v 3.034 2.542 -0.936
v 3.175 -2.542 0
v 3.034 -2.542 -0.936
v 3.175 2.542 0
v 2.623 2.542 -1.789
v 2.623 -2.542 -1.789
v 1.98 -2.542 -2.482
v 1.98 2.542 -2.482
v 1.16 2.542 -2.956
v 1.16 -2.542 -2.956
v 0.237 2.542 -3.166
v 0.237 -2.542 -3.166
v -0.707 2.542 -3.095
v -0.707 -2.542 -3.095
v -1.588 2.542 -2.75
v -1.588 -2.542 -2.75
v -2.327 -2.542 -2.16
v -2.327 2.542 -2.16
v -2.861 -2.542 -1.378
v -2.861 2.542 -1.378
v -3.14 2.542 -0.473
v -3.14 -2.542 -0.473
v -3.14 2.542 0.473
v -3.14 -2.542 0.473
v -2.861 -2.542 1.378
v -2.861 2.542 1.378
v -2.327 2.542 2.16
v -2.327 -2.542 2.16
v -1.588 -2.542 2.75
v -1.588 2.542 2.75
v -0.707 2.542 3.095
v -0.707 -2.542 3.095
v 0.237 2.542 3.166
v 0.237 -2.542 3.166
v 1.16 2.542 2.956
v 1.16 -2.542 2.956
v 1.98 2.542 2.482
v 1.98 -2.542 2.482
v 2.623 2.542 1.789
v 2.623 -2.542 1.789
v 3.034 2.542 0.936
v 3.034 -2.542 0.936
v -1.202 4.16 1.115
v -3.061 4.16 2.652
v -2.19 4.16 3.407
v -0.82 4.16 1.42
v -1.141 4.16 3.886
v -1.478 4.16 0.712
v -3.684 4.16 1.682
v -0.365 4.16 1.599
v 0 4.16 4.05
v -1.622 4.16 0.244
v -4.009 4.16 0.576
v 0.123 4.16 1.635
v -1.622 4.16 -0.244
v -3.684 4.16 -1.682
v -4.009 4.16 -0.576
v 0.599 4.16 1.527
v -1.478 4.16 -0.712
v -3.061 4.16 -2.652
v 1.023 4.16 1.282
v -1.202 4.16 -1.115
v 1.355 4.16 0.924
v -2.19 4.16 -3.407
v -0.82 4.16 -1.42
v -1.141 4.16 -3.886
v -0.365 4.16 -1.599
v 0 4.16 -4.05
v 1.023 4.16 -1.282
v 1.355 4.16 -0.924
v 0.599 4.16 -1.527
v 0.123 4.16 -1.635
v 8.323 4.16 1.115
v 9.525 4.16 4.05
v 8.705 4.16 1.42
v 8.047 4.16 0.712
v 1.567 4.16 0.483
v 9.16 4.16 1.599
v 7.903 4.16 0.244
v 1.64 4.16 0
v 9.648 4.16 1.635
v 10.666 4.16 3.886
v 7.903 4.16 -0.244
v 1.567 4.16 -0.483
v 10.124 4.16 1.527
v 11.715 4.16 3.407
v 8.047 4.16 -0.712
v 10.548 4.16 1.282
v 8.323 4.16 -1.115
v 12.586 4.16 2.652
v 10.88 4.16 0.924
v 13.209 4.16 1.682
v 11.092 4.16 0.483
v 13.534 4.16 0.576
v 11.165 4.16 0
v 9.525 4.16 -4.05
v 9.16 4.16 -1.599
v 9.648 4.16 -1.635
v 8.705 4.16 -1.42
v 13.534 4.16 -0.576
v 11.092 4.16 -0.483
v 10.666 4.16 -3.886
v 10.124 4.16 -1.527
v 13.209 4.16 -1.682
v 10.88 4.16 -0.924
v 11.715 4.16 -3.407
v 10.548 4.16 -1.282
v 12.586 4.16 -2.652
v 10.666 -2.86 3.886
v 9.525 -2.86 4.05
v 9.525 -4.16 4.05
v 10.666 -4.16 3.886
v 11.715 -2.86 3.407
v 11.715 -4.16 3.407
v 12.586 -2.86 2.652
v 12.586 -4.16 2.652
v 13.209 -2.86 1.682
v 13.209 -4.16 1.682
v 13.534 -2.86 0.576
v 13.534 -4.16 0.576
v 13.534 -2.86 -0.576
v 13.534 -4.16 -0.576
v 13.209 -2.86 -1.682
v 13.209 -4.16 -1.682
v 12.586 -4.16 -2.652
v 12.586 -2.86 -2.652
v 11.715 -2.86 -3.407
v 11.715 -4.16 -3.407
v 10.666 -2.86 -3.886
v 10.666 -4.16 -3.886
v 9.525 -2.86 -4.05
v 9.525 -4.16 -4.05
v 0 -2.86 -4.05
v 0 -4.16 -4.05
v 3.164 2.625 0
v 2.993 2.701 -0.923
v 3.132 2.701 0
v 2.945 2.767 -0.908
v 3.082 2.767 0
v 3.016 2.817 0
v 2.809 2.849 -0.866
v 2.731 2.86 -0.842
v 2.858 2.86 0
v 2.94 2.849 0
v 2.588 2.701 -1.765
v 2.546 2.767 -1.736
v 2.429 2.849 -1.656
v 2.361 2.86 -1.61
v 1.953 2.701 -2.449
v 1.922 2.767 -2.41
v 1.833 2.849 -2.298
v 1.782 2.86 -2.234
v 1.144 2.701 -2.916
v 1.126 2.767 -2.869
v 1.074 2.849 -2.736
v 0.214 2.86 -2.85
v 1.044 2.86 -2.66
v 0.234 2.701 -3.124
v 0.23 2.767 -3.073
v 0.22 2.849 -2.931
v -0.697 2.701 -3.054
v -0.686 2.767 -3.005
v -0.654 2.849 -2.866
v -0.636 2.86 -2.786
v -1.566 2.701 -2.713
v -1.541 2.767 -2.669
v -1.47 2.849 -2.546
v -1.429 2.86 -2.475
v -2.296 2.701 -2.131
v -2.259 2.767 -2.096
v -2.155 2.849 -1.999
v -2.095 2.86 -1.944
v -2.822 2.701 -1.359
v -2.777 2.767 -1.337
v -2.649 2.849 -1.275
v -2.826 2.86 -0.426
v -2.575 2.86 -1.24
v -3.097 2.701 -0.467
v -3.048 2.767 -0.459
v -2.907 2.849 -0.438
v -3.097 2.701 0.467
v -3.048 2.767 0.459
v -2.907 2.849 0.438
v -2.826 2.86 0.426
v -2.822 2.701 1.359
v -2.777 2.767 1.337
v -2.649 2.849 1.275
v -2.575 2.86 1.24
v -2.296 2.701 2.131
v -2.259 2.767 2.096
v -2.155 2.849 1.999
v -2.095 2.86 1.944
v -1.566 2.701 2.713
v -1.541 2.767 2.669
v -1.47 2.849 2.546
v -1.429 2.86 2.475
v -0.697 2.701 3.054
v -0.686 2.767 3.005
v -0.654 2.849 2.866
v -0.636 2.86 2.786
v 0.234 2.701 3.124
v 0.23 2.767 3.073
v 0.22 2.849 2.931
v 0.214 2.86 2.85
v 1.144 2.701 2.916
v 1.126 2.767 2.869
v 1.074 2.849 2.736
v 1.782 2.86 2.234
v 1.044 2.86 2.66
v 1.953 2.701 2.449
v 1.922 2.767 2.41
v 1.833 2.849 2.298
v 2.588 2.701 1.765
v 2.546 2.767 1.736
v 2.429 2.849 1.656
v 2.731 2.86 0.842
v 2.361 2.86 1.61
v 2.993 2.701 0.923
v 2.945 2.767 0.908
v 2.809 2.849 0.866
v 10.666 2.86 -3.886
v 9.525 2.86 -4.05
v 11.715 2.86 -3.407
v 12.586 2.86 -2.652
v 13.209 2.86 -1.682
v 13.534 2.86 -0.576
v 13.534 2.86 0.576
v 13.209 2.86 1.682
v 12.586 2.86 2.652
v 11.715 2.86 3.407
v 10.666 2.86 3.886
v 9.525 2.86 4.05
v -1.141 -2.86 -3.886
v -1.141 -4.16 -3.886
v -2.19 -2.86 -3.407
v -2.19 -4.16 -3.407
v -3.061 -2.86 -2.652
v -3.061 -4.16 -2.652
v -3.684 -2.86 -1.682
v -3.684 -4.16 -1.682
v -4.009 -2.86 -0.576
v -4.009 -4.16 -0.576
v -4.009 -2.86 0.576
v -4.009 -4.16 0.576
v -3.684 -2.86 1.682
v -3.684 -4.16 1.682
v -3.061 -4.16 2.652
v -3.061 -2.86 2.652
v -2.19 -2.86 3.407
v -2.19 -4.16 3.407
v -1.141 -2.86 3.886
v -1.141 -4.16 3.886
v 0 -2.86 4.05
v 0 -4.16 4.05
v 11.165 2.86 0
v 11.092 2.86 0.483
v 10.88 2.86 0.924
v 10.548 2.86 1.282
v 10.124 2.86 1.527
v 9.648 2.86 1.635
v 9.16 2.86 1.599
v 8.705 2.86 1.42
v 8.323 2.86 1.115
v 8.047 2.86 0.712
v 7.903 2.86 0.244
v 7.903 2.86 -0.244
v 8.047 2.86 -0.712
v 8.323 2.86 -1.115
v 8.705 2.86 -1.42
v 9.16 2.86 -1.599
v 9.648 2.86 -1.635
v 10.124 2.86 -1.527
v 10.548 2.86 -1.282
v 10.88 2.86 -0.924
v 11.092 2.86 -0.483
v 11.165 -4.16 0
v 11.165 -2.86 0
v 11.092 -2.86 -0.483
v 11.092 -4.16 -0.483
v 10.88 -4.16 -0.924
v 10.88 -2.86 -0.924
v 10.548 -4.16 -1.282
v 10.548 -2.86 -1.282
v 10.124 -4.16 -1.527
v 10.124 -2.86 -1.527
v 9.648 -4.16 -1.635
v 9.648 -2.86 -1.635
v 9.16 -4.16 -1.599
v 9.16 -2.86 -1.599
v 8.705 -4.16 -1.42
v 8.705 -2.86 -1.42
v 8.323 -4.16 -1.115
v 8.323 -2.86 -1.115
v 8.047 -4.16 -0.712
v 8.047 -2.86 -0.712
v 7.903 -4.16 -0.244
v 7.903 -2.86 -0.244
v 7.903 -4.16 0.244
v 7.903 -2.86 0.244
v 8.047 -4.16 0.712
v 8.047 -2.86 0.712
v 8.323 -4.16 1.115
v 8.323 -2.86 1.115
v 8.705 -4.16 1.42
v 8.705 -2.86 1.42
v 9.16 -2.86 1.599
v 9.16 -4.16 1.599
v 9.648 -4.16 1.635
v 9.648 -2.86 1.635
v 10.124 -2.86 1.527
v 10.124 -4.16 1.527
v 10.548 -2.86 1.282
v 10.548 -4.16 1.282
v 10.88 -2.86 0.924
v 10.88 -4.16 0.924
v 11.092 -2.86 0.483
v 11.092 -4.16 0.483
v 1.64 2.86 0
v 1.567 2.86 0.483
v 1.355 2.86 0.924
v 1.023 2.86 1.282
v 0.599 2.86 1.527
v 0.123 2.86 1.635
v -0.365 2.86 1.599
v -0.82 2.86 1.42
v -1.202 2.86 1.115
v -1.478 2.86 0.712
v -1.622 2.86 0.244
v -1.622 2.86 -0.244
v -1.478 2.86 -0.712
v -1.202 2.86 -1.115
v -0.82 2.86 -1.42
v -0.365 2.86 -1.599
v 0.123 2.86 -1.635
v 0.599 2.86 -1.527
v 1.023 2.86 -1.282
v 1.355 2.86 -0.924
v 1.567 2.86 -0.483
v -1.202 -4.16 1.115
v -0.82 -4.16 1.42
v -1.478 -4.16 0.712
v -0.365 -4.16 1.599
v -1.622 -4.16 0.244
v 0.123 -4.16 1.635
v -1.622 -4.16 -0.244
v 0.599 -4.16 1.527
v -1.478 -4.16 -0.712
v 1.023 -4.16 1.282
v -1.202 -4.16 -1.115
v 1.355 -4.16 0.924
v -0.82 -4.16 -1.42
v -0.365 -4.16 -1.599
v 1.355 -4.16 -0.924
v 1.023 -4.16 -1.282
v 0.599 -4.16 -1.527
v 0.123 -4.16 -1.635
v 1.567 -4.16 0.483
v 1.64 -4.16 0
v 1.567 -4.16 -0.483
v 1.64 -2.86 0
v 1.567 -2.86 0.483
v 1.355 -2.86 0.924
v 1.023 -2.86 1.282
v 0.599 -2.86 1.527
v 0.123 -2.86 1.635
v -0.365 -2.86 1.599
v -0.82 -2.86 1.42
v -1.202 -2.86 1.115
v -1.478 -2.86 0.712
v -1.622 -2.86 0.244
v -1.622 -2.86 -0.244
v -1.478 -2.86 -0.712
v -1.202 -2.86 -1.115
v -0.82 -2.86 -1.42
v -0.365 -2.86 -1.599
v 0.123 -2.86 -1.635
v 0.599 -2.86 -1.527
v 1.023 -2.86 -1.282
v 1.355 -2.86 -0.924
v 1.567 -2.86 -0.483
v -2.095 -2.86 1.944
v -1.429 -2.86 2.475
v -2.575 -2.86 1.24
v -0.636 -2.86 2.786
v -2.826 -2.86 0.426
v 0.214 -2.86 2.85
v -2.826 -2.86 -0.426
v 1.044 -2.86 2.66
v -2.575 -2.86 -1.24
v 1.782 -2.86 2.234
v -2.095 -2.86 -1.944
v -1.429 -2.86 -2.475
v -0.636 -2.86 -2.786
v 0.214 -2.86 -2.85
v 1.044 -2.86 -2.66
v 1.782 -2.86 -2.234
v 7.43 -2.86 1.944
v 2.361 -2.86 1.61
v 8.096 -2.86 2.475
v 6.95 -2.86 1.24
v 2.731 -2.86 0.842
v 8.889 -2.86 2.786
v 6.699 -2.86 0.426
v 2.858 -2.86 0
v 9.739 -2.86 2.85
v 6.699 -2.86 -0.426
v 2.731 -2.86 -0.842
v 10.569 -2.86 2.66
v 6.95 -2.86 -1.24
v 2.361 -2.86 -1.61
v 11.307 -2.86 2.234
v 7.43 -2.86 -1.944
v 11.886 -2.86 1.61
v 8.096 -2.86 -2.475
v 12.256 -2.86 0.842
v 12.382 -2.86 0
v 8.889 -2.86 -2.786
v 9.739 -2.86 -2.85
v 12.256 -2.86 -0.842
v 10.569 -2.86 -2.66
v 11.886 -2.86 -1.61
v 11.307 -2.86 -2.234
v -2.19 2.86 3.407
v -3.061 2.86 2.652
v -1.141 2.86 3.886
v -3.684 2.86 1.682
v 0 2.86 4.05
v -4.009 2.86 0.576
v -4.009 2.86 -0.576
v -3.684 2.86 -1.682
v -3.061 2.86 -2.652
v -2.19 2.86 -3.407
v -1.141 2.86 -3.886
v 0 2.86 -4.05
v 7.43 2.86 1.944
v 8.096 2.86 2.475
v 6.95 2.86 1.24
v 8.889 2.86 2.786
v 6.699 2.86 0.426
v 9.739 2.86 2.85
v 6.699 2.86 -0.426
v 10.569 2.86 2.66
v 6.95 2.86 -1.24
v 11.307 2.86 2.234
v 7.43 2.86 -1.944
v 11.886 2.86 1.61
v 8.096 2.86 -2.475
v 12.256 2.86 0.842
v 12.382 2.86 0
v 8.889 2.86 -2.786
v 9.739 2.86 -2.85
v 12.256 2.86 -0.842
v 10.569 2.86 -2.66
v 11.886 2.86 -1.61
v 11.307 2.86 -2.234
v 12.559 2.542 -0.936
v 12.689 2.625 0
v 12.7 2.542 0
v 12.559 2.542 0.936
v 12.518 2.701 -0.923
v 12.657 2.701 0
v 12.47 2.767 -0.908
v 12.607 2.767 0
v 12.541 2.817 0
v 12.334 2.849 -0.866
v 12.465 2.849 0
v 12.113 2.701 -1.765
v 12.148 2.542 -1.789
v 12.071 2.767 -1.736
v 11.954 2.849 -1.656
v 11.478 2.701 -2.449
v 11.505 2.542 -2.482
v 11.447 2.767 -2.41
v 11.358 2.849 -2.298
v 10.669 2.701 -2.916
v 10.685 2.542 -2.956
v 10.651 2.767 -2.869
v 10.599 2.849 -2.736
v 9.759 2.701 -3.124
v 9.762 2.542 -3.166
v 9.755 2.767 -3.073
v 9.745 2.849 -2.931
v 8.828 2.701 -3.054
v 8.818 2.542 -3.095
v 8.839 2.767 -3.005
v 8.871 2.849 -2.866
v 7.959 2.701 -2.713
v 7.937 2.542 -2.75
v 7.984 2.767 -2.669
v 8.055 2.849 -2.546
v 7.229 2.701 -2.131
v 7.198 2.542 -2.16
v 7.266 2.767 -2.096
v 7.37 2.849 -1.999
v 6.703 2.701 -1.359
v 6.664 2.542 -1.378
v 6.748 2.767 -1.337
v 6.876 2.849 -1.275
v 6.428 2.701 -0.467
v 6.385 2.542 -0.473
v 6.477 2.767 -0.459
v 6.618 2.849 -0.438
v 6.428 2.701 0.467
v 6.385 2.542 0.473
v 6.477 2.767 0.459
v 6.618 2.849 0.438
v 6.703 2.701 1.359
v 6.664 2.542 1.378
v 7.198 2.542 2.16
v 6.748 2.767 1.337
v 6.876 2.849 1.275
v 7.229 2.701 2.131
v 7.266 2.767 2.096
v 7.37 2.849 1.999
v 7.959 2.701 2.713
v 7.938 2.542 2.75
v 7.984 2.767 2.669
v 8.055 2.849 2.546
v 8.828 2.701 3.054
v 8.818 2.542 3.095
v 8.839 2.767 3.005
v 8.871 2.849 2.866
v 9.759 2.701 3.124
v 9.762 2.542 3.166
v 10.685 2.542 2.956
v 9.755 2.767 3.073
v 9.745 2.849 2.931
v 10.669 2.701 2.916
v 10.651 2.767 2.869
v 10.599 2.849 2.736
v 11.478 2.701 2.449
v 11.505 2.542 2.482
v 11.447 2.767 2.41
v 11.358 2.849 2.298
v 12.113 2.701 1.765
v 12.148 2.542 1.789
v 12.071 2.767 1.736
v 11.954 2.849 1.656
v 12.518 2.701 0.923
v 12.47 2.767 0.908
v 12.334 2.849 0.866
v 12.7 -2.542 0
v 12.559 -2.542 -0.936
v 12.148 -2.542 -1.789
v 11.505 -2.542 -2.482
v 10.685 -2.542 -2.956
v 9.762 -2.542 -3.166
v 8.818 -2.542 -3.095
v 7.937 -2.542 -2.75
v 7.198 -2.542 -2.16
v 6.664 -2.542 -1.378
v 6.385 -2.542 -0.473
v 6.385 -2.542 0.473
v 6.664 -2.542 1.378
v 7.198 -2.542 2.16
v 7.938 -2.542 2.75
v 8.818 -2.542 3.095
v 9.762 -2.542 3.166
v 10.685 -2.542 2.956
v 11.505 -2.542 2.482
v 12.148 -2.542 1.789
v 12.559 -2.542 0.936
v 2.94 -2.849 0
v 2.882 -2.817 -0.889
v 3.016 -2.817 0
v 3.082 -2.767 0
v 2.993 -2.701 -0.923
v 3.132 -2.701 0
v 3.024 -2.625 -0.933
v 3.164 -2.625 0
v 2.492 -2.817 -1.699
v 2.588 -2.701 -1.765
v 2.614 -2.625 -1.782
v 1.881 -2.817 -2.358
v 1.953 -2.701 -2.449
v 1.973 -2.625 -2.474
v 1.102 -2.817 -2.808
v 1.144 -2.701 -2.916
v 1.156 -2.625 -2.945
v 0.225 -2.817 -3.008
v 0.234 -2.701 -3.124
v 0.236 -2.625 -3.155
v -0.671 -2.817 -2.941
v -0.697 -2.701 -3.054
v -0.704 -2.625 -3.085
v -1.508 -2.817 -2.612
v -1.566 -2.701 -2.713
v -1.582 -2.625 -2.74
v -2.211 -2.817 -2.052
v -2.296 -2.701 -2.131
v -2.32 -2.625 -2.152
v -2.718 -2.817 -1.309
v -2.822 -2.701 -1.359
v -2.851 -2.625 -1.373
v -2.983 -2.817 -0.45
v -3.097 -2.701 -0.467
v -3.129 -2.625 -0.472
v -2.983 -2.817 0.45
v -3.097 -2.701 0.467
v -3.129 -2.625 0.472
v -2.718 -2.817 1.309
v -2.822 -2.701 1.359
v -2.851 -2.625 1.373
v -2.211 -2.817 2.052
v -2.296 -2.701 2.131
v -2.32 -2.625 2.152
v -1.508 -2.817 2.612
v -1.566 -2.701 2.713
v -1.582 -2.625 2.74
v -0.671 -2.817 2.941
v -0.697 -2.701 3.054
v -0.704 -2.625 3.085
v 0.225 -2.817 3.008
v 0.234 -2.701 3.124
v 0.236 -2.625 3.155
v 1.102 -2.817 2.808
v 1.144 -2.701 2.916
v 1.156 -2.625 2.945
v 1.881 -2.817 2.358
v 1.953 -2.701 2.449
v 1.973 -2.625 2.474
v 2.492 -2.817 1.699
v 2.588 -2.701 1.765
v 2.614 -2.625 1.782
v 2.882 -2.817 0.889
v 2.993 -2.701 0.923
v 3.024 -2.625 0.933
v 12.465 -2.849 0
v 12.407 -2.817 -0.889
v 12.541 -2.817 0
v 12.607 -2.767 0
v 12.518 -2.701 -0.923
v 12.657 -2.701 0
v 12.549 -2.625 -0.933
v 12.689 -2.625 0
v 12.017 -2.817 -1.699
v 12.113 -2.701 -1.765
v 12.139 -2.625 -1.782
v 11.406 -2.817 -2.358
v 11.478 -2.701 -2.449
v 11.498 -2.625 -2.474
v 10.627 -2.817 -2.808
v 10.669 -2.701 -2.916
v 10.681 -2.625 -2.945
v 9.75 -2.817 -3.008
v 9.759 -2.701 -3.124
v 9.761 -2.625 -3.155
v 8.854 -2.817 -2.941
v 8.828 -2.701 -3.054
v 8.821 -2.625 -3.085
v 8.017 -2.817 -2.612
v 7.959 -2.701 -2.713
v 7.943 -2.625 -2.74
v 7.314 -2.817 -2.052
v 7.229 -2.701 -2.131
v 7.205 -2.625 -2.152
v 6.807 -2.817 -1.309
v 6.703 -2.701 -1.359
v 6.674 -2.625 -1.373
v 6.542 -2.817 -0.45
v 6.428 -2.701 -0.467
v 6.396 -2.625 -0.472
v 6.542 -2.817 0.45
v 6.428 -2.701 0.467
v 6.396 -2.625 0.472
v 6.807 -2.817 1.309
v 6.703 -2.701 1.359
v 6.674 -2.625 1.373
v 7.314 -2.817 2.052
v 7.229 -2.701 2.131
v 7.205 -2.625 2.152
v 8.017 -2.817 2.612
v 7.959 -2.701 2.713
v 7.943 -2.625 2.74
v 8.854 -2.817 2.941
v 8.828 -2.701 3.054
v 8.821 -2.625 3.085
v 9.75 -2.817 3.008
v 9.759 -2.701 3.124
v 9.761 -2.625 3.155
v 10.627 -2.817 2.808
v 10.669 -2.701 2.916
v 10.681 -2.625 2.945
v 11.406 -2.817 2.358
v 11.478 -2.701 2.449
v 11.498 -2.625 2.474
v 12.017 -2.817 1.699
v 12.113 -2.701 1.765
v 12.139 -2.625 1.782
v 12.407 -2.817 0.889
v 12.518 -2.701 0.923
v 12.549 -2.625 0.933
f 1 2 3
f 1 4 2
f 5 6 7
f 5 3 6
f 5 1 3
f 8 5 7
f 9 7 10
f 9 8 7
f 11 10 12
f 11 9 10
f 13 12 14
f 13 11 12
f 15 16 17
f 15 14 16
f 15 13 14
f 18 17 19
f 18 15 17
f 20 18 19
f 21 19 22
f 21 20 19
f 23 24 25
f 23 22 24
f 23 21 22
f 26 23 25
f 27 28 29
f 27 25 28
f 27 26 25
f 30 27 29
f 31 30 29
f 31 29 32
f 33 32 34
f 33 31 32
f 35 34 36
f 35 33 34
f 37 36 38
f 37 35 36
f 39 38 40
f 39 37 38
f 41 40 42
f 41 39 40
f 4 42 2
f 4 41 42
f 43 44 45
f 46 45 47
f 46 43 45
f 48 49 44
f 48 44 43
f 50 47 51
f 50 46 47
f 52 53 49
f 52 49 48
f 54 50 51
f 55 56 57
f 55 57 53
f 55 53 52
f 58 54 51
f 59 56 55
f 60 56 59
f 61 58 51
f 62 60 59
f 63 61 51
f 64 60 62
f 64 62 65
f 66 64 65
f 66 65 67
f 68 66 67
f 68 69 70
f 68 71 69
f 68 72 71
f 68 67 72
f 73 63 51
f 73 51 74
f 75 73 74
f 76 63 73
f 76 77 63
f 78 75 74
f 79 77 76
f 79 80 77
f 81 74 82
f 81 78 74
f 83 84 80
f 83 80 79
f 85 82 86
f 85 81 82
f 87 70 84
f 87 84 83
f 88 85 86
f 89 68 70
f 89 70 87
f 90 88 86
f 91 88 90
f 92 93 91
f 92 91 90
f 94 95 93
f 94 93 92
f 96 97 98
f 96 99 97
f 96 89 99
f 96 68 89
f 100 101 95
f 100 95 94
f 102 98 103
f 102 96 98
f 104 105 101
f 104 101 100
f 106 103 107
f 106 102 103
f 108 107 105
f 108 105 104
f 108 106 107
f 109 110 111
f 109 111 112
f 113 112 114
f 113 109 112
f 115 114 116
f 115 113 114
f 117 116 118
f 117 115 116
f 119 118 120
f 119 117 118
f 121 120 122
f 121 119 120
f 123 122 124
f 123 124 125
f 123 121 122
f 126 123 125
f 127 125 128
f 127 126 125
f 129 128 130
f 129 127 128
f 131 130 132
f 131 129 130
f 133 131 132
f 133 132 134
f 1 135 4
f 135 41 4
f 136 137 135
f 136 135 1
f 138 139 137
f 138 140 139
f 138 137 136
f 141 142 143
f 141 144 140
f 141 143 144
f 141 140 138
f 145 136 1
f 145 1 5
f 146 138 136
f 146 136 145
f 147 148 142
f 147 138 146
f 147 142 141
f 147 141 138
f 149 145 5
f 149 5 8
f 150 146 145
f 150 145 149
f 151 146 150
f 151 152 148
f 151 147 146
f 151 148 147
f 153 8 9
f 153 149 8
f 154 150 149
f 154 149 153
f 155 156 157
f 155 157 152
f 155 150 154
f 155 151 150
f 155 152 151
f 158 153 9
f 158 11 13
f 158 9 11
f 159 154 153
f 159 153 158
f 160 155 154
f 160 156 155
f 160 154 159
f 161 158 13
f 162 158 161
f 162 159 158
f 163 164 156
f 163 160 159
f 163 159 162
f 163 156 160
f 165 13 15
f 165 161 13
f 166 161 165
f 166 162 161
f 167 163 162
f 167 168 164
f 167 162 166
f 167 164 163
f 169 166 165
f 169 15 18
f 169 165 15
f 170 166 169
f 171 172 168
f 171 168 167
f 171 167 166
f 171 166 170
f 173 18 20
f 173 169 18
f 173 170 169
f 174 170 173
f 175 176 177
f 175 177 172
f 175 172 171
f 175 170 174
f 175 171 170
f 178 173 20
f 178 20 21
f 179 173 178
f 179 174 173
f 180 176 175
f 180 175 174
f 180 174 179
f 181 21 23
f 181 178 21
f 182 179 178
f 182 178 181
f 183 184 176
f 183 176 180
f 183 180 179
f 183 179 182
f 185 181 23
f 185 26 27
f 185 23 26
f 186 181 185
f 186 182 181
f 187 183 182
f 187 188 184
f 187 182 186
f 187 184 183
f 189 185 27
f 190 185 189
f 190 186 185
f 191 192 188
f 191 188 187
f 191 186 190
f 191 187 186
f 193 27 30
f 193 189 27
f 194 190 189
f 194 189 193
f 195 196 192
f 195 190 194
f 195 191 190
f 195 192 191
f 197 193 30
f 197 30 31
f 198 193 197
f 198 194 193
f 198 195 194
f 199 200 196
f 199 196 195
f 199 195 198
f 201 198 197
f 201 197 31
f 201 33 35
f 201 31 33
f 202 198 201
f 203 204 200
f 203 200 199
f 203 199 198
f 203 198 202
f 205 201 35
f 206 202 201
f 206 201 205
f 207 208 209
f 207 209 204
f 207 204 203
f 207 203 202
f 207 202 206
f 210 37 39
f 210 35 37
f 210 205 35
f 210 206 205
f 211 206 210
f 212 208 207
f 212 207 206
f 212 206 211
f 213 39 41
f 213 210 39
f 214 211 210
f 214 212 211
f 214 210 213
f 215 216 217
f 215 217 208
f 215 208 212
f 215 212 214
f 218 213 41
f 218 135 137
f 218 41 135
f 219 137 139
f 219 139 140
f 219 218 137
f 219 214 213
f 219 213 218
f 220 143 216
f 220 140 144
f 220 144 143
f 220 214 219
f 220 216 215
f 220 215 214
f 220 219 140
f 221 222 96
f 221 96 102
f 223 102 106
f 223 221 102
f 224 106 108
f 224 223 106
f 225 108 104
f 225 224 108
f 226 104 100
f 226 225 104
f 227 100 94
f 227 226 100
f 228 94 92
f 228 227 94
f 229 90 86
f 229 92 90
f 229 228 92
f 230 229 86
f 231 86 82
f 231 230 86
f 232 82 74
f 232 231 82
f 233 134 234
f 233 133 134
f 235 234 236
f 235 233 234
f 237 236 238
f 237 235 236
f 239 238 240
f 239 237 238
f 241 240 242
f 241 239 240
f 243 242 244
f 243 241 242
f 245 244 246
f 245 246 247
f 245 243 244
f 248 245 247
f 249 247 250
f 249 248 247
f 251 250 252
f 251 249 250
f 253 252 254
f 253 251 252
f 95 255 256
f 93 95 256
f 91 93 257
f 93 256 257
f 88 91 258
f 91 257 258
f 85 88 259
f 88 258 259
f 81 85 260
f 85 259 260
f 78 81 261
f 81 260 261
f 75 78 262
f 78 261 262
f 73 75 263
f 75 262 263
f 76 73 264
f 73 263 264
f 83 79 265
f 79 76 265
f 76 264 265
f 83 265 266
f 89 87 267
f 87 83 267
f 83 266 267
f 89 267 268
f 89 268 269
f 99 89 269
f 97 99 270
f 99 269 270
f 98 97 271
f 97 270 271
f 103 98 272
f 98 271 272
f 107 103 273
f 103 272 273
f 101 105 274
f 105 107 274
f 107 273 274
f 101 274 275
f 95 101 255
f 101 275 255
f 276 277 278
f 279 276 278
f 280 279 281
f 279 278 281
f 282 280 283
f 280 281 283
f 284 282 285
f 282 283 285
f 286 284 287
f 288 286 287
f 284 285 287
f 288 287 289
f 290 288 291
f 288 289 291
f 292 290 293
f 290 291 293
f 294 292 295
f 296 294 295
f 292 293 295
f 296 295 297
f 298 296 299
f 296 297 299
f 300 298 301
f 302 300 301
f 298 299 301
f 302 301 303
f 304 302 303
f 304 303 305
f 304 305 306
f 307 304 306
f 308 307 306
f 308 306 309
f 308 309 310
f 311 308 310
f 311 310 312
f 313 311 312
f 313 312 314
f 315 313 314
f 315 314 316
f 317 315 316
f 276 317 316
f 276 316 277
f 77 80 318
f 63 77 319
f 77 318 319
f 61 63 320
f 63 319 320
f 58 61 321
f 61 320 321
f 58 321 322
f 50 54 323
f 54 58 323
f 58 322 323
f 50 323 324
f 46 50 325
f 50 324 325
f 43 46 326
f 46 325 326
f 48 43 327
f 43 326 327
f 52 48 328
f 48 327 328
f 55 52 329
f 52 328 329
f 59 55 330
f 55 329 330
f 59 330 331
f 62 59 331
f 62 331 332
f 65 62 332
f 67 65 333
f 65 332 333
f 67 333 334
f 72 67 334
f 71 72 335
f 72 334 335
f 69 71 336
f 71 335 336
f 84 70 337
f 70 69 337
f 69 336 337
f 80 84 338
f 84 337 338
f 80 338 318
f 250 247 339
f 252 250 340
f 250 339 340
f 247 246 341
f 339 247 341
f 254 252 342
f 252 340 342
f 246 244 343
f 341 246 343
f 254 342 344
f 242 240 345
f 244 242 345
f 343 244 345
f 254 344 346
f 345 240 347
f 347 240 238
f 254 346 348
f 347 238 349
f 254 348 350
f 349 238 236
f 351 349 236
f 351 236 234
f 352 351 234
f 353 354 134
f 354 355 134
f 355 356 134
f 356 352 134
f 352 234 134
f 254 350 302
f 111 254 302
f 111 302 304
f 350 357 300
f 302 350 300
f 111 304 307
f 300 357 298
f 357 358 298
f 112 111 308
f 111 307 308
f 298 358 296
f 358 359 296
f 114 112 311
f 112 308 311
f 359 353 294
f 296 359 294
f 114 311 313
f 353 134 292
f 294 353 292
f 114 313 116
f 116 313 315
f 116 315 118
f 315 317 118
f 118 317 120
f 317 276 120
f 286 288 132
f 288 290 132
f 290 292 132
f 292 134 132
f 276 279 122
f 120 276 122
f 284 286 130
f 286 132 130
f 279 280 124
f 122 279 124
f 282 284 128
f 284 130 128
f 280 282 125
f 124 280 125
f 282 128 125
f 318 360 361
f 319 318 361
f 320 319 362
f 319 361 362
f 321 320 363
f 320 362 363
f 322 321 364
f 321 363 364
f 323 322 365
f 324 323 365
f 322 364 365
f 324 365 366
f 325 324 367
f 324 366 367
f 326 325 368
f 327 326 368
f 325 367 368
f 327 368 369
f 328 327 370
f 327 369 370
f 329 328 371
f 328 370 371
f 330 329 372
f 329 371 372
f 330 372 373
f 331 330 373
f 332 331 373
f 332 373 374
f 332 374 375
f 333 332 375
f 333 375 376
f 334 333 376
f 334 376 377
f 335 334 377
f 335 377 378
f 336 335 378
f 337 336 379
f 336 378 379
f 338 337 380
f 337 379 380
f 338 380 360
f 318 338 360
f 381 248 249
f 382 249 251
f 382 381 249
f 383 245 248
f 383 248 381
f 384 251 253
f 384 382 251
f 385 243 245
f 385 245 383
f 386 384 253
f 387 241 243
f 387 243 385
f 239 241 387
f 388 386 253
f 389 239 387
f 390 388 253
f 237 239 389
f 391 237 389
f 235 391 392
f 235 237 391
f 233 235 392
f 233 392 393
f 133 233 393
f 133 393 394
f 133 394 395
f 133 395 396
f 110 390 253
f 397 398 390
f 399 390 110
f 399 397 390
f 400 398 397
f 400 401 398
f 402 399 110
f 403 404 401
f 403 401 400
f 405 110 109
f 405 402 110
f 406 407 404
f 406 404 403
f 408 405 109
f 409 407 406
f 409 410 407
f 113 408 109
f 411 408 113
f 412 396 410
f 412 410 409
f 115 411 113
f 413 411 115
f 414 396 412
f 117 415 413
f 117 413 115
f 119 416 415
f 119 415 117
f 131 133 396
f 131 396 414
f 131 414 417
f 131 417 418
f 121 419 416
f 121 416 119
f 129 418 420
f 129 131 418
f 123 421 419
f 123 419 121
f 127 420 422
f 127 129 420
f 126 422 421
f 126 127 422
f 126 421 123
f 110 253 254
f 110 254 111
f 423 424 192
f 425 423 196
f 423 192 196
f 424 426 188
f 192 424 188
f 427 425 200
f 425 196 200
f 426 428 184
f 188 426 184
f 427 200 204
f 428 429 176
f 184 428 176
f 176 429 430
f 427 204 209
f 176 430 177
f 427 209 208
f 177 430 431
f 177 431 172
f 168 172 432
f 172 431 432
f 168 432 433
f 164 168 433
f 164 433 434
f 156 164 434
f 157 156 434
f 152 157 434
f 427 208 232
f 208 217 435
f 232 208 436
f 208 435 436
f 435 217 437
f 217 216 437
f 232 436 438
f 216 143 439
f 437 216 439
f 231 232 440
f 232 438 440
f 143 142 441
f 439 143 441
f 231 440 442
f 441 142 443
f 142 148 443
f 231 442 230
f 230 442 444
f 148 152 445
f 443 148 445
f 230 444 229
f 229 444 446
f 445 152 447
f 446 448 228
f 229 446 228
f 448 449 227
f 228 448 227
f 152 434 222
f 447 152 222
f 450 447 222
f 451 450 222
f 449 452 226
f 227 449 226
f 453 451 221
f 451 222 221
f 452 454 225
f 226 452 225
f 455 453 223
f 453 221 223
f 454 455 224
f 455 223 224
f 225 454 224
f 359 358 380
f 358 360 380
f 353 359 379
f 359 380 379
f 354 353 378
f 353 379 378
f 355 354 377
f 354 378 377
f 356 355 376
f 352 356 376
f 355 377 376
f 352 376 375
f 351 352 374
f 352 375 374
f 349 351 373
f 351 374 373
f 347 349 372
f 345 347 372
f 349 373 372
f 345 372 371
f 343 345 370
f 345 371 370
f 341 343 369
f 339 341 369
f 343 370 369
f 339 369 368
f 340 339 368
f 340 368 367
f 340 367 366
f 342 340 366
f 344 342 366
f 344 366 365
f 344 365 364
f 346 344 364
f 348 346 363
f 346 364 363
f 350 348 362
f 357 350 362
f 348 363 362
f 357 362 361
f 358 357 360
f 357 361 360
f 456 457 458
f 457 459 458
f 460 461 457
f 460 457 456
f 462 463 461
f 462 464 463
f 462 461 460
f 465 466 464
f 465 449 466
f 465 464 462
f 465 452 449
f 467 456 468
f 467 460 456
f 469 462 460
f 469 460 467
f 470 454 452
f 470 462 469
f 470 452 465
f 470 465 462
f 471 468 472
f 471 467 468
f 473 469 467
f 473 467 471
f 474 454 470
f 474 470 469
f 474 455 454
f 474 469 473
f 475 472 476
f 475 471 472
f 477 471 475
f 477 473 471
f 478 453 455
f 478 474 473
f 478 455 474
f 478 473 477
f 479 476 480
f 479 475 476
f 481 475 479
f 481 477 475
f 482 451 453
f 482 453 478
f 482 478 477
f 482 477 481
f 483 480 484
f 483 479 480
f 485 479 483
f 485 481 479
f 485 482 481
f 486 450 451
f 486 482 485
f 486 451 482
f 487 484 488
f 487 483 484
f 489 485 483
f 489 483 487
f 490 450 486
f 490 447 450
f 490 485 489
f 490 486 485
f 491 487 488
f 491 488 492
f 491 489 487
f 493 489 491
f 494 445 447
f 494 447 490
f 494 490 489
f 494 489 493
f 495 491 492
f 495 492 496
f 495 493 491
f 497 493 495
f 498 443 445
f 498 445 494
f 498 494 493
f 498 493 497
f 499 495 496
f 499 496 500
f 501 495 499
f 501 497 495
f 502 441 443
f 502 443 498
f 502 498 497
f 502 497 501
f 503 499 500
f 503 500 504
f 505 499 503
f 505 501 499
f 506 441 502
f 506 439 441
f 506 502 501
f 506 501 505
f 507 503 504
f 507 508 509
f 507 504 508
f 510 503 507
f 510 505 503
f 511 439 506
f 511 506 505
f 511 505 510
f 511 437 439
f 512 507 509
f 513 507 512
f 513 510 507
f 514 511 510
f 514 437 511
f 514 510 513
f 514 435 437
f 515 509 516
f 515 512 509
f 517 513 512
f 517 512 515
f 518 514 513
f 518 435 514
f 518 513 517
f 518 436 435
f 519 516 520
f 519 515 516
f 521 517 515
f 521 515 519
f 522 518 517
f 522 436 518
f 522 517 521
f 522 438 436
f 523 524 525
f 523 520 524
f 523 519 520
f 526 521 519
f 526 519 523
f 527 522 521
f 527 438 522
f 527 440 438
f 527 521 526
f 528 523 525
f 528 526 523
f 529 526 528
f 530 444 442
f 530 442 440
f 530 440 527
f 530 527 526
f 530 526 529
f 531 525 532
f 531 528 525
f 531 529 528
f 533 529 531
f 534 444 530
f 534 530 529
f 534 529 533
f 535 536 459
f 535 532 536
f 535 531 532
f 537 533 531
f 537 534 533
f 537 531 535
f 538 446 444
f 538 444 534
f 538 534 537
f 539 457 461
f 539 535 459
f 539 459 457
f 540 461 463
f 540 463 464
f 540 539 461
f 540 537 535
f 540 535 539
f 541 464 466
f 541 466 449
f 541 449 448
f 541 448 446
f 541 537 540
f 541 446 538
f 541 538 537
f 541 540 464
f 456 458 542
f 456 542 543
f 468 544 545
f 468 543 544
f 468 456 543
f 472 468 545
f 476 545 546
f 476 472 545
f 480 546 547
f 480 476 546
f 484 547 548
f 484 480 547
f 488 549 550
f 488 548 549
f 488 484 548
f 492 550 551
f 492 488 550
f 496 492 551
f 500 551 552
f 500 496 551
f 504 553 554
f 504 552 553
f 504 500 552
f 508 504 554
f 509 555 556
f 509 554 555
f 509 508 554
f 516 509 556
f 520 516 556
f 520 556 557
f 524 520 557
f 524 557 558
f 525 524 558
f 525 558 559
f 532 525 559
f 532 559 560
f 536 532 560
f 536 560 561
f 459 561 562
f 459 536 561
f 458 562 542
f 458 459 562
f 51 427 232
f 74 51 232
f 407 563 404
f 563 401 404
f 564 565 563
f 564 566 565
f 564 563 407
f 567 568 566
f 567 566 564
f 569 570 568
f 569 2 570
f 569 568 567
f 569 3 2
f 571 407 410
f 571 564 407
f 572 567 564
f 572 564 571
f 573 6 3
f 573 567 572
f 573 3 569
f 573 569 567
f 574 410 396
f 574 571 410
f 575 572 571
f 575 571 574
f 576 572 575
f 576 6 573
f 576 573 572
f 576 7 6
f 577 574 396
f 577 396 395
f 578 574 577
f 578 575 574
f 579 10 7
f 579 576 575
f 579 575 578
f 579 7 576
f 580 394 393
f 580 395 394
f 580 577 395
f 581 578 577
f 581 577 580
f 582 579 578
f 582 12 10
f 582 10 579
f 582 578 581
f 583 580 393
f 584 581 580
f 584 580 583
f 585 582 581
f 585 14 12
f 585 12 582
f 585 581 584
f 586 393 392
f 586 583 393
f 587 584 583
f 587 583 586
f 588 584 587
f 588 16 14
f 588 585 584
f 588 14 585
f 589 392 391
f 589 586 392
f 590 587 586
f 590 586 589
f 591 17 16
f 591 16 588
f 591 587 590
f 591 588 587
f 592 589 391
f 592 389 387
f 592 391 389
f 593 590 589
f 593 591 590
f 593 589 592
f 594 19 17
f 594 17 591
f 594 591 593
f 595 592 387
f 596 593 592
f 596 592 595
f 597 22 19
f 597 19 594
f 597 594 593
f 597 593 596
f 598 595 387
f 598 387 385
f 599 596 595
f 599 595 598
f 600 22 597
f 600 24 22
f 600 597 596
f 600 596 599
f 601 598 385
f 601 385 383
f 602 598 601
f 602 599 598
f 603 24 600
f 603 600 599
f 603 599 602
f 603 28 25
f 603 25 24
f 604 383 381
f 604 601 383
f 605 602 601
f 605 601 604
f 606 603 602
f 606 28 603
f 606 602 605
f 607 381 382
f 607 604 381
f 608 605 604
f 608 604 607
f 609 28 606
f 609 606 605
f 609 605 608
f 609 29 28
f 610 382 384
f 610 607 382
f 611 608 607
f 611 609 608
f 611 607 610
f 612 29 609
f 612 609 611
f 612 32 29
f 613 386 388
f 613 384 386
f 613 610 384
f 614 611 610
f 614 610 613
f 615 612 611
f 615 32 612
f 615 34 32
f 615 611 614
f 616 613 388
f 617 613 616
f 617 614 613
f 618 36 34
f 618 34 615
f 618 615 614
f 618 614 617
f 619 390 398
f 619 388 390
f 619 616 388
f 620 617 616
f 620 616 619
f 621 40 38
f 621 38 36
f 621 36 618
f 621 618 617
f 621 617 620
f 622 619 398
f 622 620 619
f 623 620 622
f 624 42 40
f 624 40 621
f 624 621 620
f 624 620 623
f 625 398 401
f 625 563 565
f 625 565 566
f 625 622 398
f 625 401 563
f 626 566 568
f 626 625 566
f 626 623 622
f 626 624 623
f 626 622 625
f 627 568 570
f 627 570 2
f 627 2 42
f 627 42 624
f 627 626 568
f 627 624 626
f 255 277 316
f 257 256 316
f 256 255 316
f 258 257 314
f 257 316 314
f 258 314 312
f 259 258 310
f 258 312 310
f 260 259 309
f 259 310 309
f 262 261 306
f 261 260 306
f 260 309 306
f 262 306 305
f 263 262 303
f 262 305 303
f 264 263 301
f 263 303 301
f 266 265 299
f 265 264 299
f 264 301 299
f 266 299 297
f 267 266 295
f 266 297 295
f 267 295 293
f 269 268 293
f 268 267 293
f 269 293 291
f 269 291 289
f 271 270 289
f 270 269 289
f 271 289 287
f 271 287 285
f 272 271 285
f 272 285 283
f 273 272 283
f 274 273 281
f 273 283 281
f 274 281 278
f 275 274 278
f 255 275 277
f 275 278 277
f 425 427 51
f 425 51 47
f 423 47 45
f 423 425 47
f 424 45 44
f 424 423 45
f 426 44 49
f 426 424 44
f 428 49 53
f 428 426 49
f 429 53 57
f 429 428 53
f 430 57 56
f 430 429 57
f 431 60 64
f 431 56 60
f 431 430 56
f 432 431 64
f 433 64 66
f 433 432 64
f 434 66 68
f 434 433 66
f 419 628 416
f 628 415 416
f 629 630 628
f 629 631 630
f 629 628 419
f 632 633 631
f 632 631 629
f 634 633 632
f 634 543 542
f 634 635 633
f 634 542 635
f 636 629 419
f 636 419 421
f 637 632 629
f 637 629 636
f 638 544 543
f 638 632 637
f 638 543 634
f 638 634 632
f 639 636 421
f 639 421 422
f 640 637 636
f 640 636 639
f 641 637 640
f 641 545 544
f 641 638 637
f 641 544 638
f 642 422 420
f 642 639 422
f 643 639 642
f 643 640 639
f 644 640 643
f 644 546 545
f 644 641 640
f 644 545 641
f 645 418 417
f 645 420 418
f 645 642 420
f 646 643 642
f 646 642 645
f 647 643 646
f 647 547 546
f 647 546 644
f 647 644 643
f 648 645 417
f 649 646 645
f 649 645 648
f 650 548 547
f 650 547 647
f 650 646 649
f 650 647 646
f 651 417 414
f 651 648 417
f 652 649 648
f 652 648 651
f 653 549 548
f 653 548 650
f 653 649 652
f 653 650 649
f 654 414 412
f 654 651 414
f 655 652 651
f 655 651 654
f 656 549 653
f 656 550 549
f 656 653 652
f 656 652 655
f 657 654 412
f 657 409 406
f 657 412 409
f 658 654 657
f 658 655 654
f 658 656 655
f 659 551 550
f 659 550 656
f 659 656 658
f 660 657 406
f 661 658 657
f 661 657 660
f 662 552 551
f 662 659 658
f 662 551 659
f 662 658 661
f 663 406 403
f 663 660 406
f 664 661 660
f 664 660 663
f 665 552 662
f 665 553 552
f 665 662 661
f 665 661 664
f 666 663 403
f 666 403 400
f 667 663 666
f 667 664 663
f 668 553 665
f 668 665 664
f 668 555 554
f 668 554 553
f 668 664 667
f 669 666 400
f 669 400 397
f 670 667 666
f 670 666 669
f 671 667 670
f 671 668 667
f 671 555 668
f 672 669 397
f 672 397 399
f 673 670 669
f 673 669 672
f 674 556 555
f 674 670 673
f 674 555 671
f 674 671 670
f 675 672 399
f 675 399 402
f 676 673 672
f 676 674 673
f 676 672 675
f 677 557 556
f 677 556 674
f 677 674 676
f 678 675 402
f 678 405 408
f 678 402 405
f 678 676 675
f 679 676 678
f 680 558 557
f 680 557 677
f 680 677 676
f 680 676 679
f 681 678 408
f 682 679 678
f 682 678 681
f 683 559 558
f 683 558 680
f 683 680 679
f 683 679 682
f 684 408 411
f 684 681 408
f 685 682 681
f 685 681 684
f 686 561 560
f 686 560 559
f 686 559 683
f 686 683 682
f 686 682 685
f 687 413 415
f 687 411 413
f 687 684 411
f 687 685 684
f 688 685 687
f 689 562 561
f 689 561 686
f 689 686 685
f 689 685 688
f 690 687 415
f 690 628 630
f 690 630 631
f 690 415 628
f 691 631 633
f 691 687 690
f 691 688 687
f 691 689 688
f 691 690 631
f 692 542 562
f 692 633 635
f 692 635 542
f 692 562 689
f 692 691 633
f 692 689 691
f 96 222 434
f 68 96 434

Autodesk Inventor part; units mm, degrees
sketch "Sketch_2" plane through (0, 0, 0) normal (0, 0, 1) x (1, 0, 0)
  line L0 (0, -2.86) -> (0, 2.86)
  line L1 (1.64, 2.86) -> (1.64, -2.86)
  line L2 (1.64, -2.86) -> (2.8575, -2.86)
  arc A0 (2.8575, -2.86) -> (3.175, -2.5425) centre (2.8575, -2.5425) ccw
  line L3 (3.175, -2.5425) -> (3.175, 2.5425)
  arc A1 (3.175, 2.5425) -> (2.8575, 2.86) centre (2.8575, 2.5425) ccw
  line L4 (2.8575, 2.86) -> (1.64, 2.86)
revolve "Revolution1" add sketch "Sketch_2" angle 360 about axis through (0, -2.86, 0) along (0, -1, 0)
sketch "Sketch_5" plane through (0, 2.86, 0) normal (0, 1, 0) x (1, 0, 0)
  arc A0 (0, 4.05) -> (0, -4.05) centre (0, 0) ccw
  line L0 (0, -4.05) -> (9.525, -4.05)
  arc A1 (9.525, -4.05) -> (9.525, 4.05) centre (9.525, 0) ccw
  line L1 (9.525, 4.05) -> (0, 4.05)
  circle A2 centre (9.525, 0) radius 1.64
  circle A3 centre (0, 0) radius 1.64
extrude "Extrusion1" add sketch "Sketch_5" along normal blind 1.3
sketch "Sketch_6" plane through (0, -2.86, 0) normal (0, 1, 0) x (1, 0, 0)
  arc A0 (0, 4.05) -> (0, -4.05) centre (0, 0) ccw
  line L0 (0, -4.05) -> (9.525, -4.05)
  arc A1 (9.525, -4.05) -> (9.525, 4.05) centre (9.525, 0) ccw
  line L1 (9.525, 4.05) -> (0, 4.05)
  circle A2 centre (9.525, 0) radius 1.64
  circle A3 centre (0, 0) radius 1.64
extrude "Extrusion2" add sketch "Sketch_6" against normal blind 1.3
sketch "Sketch_8" plane through (0, 0, 0) normal (0, 0, 1) x (1, 0, 0)
  line L0 (9.525, -2.86) -> (9.525, 2.86)
  line L1 (11.165, 2.86) -> (11.165, -2.86)
  line L2 (11.165, -2.86) -> (12.3825, -2.86)
  arc A0 (12.3825, -2.86) -> (12.7, -2.5425) centre (12.3825, -2.5425) ccw
  line L3 (12.7, -2.5425) -> (12.7, 2.5425)
  arc A1 (12.7, 2.5425) -> (12.3825, 2.86) centre (12.3825, 2.5425) ccw
  line L4 (12.3825, 2.86) -> (11.165, 2.86)
revolve "Revolution2" add sketch "Sketch_8" angle 360 about axis through (9.525, -2.86, 0) along (0, -1, 0)
ref_plane "for_body1_a_XY" through (9.525, 0, 0) normal (0, 1, 0) x (1, 0, 0)
ref_plane "for_body1_a_YZ" through (9.525, 0, 0) normal (1, 0, 0) x (0, 0, -1)
ref_plane "for_body1_a_ZX" through (9.525, 0, 0) normal (0, 0, -1) x (0, 1, 0)
ref_plane "to_dummy_XY" through (0, 0, 0) normal (0, 1, 0) x (1, 0, 0)
ref_plane "to_dummy_YZ" through (0, 0, 0) normal (1, 0, 0) x (0, 0, -1)
ref_plane "to_dummy_ZX" through (0, 0, 0) normal (0, 0, -1) x (0, 1, 0)
properties part number "06B - 1 RP - Body"
